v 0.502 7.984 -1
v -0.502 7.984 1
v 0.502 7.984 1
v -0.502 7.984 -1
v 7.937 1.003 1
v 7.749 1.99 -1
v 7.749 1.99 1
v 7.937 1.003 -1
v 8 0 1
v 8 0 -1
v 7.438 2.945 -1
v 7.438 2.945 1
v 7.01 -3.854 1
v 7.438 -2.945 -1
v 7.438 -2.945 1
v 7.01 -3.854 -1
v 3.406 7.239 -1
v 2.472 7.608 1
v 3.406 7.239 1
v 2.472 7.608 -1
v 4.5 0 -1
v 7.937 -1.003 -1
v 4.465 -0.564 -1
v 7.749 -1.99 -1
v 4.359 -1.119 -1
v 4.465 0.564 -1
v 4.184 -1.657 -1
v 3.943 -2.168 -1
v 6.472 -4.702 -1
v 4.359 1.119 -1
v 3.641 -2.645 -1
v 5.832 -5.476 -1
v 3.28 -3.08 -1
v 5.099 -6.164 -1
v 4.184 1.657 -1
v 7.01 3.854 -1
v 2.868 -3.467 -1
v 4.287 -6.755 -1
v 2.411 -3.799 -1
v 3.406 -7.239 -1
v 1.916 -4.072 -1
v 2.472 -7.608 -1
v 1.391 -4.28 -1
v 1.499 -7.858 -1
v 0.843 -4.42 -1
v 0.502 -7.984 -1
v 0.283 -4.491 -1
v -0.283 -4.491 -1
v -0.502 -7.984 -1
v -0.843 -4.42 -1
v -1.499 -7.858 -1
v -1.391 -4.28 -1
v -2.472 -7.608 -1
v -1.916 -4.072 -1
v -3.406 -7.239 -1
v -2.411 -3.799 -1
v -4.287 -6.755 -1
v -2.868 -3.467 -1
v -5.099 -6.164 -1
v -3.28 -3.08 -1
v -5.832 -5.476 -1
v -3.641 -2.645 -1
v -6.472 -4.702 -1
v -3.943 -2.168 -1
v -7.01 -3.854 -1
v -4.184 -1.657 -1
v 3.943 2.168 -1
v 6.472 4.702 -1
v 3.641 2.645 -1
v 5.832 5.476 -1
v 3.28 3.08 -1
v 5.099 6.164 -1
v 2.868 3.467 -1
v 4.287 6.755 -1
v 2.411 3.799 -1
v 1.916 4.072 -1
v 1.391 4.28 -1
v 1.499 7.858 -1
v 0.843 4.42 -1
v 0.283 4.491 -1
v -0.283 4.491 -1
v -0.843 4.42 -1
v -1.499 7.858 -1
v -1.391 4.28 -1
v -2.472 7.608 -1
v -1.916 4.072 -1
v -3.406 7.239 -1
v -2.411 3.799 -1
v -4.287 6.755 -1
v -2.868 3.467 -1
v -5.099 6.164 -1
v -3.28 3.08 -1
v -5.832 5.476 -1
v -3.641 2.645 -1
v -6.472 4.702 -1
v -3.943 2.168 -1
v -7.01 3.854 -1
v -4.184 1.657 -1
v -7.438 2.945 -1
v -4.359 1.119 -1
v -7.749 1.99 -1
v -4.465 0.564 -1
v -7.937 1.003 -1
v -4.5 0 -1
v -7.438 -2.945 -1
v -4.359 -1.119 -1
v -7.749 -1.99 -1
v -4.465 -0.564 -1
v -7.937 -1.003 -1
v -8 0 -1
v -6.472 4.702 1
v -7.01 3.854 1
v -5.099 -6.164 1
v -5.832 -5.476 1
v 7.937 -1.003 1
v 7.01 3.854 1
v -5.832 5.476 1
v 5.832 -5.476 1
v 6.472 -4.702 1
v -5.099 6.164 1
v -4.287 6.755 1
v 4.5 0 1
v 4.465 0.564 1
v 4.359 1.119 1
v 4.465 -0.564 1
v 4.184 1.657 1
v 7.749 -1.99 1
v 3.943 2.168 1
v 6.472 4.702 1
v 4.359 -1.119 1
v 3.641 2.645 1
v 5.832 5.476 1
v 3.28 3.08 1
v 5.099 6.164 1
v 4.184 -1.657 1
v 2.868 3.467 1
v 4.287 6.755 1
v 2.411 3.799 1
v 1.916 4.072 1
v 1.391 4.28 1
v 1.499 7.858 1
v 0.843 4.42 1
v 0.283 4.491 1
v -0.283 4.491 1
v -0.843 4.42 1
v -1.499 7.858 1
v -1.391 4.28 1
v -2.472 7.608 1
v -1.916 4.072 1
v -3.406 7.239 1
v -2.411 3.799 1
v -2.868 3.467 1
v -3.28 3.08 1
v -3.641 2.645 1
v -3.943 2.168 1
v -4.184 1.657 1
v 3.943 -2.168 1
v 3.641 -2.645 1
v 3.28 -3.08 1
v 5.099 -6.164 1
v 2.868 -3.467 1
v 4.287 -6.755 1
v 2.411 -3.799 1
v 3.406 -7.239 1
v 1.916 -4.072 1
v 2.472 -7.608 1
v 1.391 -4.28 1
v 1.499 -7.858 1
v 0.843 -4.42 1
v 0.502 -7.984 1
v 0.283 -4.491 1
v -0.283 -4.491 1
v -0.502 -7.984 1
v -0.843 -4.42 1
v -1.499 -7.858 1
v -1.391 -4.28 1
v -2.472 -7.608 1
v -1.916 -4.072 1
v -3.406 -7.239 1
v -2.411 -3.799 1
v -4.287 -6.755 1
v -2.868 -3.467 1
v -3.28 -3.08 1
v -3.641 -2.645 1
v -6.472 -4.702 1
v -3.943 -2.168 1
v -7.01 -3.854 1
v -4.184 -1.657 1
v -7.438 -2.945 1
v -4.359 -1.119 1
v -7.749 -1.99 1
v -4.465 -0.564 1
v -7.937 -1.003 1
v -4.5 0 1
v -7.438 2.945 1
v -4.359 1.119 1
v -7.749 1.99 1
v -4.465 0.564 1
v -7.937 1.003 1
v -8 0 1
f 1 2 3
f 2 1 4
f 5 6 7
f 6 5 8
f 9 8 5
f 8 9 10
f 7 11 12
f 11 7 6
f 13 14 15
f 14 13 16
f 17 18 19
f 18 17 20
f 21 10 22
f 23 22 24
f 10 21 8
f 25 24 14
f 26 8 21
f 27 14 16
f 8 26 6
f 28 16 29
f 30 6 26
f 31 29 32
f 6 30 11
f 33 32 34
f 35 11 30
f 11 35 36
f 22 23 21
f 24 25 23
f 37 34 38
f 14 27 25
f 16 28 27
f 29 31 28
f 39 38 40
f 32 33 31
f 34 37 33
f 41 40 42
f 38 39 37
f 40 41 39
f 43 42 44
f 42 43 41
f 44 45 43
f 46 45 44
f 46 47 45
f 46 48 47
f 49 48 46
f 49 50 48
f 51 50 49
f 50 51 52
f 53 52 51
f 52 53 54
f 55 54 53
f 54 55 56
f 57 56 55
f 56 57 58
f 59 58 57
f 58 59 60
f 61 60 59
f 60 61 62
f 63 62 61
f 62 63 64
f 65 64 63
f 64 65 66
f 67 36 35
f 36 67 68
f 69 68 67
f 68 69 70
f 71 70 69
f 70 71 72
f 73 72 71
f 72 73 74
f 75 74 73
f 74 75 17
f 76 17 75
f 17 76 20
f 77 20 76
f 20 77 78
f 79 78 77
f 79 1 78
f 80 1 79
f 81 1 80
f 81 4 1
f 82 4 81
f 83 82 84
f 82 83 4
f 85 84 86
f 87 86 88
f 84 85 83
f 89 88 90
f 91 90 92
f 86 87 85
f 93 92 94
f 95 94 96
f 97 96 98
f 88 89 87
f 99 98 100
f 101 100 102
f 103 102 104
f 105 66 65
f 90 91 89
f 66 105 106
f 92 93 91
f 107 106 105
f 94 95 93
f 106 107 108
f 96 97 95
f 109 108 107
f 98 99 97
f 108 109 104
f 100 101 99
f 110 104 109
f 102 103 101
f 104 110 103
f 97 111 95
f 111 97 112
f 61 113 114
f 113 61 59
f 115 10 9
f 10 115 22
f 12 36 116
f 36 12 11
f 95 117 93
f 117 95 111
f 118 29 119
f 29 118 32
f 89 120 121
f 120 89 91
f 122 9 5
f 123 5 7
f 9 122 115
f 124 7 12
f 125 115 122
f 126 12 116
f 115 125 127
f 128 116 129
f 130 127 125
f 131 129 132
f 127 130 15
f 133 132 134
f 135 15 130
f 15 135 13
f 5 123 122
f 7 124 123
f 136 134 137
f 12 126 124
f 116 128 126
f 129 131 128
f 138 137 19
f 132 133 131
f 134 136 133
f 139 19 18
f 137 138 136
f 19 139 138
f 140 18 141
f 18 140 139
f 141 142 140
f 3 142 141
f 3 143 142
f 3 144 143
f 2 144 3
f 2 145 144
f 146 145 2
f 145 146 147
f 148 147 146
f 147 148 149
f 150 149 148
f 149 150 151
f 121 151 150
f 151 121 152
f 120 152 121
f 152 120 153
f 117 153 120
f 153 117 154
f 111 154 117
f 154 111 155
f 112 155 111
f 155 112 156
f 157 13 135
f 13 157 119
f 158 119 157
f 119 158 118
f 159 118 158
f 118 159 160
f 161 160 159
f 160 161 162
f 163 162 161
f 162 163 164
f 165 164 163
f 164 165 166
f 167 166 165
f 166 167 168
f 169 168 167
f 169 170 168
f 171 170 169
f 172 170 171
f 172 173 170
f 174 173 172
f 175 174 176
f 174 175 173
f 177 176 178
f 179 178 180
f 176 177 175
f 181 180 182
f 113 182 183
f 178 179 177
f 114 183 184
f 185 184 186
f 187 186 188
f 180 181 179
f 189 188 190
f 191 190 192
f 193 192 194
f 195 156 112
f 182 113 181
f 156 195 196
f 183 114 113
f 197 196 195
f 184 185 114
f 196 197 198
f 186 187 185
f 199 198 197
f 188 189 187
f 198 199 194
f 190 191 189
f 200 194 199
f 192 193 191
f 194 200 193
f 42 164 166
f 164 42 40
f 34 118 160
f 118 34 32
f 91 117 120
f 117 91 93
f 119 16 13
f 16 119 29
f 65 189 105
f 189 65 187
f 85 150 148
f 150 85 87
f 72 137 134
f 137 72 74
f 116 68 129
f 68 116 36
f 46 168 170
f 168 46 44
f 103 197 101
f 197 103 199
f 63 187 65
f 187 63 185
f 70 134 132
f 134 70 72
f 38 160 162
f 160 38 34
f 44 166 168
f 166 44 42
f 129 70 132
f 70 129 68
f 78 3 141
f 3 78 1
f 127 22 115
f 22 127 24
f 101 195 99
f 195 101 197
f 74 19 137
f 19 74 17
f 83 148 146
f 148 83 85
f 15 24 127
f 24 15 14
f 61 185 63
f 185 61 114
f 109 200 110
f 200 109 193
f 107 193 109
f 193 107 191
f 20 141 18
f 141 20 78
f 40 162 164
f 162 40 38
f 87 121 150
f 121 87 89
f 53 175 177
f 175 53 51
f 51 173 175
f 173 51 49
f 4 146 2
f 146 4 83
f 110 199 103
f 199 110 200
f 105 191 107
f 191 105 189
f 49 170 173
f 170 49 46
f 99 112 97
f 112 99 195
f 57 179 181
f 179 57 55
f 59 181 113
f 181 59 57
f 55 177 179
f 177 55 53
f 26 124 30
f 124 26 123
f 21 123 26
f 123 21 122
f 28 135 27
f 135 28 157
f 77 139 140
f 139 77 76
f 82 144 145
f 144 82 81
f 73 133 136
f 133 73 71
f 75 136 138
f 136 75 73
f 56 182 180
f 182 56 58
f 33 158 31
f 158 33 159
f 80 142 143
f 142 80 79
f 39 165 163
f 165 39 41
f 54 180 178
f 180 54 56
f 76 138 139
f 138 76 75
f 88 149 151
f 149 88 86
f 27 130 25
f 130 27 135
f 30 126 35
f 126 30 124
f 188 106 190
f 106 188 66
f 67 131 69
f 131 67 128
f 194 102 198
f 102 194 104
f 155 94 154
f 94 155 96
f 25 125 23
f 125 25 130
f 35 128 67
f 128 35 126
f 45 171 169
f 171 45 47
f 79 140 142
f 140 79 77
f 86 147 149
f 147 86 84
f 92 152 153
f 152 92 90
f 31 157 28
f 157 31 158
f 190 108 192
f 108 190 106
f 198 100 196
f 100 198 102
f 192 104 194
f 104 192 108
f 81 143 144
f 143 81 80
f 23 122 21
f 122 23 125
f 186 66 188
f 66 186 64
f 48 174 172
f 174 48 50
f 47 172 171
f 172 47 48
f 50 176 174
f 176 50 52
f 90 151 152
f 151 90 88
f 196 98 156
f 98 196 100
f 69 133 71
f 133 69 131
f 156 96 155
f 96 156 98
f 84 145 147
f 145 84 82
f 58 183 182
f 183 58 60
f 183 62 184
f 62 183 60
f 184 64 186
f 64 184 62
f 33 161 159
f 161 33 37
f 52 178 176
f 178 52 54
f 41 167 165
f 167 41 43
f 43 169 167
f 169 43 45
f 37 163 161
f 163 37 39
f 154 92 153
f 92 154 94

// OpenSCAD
$fn = 50;


difference() {
	union() {
		translate(v = [0, 0, -1.0000000000]) {
			cylinder(h = 2, r = 8.0000000000);
		}
	}
	union() {
		translate(v = [0, 0, -100.0000000000]) {
			cylinder(h = 200, r = 4.5000000000);
		}
	}
}
